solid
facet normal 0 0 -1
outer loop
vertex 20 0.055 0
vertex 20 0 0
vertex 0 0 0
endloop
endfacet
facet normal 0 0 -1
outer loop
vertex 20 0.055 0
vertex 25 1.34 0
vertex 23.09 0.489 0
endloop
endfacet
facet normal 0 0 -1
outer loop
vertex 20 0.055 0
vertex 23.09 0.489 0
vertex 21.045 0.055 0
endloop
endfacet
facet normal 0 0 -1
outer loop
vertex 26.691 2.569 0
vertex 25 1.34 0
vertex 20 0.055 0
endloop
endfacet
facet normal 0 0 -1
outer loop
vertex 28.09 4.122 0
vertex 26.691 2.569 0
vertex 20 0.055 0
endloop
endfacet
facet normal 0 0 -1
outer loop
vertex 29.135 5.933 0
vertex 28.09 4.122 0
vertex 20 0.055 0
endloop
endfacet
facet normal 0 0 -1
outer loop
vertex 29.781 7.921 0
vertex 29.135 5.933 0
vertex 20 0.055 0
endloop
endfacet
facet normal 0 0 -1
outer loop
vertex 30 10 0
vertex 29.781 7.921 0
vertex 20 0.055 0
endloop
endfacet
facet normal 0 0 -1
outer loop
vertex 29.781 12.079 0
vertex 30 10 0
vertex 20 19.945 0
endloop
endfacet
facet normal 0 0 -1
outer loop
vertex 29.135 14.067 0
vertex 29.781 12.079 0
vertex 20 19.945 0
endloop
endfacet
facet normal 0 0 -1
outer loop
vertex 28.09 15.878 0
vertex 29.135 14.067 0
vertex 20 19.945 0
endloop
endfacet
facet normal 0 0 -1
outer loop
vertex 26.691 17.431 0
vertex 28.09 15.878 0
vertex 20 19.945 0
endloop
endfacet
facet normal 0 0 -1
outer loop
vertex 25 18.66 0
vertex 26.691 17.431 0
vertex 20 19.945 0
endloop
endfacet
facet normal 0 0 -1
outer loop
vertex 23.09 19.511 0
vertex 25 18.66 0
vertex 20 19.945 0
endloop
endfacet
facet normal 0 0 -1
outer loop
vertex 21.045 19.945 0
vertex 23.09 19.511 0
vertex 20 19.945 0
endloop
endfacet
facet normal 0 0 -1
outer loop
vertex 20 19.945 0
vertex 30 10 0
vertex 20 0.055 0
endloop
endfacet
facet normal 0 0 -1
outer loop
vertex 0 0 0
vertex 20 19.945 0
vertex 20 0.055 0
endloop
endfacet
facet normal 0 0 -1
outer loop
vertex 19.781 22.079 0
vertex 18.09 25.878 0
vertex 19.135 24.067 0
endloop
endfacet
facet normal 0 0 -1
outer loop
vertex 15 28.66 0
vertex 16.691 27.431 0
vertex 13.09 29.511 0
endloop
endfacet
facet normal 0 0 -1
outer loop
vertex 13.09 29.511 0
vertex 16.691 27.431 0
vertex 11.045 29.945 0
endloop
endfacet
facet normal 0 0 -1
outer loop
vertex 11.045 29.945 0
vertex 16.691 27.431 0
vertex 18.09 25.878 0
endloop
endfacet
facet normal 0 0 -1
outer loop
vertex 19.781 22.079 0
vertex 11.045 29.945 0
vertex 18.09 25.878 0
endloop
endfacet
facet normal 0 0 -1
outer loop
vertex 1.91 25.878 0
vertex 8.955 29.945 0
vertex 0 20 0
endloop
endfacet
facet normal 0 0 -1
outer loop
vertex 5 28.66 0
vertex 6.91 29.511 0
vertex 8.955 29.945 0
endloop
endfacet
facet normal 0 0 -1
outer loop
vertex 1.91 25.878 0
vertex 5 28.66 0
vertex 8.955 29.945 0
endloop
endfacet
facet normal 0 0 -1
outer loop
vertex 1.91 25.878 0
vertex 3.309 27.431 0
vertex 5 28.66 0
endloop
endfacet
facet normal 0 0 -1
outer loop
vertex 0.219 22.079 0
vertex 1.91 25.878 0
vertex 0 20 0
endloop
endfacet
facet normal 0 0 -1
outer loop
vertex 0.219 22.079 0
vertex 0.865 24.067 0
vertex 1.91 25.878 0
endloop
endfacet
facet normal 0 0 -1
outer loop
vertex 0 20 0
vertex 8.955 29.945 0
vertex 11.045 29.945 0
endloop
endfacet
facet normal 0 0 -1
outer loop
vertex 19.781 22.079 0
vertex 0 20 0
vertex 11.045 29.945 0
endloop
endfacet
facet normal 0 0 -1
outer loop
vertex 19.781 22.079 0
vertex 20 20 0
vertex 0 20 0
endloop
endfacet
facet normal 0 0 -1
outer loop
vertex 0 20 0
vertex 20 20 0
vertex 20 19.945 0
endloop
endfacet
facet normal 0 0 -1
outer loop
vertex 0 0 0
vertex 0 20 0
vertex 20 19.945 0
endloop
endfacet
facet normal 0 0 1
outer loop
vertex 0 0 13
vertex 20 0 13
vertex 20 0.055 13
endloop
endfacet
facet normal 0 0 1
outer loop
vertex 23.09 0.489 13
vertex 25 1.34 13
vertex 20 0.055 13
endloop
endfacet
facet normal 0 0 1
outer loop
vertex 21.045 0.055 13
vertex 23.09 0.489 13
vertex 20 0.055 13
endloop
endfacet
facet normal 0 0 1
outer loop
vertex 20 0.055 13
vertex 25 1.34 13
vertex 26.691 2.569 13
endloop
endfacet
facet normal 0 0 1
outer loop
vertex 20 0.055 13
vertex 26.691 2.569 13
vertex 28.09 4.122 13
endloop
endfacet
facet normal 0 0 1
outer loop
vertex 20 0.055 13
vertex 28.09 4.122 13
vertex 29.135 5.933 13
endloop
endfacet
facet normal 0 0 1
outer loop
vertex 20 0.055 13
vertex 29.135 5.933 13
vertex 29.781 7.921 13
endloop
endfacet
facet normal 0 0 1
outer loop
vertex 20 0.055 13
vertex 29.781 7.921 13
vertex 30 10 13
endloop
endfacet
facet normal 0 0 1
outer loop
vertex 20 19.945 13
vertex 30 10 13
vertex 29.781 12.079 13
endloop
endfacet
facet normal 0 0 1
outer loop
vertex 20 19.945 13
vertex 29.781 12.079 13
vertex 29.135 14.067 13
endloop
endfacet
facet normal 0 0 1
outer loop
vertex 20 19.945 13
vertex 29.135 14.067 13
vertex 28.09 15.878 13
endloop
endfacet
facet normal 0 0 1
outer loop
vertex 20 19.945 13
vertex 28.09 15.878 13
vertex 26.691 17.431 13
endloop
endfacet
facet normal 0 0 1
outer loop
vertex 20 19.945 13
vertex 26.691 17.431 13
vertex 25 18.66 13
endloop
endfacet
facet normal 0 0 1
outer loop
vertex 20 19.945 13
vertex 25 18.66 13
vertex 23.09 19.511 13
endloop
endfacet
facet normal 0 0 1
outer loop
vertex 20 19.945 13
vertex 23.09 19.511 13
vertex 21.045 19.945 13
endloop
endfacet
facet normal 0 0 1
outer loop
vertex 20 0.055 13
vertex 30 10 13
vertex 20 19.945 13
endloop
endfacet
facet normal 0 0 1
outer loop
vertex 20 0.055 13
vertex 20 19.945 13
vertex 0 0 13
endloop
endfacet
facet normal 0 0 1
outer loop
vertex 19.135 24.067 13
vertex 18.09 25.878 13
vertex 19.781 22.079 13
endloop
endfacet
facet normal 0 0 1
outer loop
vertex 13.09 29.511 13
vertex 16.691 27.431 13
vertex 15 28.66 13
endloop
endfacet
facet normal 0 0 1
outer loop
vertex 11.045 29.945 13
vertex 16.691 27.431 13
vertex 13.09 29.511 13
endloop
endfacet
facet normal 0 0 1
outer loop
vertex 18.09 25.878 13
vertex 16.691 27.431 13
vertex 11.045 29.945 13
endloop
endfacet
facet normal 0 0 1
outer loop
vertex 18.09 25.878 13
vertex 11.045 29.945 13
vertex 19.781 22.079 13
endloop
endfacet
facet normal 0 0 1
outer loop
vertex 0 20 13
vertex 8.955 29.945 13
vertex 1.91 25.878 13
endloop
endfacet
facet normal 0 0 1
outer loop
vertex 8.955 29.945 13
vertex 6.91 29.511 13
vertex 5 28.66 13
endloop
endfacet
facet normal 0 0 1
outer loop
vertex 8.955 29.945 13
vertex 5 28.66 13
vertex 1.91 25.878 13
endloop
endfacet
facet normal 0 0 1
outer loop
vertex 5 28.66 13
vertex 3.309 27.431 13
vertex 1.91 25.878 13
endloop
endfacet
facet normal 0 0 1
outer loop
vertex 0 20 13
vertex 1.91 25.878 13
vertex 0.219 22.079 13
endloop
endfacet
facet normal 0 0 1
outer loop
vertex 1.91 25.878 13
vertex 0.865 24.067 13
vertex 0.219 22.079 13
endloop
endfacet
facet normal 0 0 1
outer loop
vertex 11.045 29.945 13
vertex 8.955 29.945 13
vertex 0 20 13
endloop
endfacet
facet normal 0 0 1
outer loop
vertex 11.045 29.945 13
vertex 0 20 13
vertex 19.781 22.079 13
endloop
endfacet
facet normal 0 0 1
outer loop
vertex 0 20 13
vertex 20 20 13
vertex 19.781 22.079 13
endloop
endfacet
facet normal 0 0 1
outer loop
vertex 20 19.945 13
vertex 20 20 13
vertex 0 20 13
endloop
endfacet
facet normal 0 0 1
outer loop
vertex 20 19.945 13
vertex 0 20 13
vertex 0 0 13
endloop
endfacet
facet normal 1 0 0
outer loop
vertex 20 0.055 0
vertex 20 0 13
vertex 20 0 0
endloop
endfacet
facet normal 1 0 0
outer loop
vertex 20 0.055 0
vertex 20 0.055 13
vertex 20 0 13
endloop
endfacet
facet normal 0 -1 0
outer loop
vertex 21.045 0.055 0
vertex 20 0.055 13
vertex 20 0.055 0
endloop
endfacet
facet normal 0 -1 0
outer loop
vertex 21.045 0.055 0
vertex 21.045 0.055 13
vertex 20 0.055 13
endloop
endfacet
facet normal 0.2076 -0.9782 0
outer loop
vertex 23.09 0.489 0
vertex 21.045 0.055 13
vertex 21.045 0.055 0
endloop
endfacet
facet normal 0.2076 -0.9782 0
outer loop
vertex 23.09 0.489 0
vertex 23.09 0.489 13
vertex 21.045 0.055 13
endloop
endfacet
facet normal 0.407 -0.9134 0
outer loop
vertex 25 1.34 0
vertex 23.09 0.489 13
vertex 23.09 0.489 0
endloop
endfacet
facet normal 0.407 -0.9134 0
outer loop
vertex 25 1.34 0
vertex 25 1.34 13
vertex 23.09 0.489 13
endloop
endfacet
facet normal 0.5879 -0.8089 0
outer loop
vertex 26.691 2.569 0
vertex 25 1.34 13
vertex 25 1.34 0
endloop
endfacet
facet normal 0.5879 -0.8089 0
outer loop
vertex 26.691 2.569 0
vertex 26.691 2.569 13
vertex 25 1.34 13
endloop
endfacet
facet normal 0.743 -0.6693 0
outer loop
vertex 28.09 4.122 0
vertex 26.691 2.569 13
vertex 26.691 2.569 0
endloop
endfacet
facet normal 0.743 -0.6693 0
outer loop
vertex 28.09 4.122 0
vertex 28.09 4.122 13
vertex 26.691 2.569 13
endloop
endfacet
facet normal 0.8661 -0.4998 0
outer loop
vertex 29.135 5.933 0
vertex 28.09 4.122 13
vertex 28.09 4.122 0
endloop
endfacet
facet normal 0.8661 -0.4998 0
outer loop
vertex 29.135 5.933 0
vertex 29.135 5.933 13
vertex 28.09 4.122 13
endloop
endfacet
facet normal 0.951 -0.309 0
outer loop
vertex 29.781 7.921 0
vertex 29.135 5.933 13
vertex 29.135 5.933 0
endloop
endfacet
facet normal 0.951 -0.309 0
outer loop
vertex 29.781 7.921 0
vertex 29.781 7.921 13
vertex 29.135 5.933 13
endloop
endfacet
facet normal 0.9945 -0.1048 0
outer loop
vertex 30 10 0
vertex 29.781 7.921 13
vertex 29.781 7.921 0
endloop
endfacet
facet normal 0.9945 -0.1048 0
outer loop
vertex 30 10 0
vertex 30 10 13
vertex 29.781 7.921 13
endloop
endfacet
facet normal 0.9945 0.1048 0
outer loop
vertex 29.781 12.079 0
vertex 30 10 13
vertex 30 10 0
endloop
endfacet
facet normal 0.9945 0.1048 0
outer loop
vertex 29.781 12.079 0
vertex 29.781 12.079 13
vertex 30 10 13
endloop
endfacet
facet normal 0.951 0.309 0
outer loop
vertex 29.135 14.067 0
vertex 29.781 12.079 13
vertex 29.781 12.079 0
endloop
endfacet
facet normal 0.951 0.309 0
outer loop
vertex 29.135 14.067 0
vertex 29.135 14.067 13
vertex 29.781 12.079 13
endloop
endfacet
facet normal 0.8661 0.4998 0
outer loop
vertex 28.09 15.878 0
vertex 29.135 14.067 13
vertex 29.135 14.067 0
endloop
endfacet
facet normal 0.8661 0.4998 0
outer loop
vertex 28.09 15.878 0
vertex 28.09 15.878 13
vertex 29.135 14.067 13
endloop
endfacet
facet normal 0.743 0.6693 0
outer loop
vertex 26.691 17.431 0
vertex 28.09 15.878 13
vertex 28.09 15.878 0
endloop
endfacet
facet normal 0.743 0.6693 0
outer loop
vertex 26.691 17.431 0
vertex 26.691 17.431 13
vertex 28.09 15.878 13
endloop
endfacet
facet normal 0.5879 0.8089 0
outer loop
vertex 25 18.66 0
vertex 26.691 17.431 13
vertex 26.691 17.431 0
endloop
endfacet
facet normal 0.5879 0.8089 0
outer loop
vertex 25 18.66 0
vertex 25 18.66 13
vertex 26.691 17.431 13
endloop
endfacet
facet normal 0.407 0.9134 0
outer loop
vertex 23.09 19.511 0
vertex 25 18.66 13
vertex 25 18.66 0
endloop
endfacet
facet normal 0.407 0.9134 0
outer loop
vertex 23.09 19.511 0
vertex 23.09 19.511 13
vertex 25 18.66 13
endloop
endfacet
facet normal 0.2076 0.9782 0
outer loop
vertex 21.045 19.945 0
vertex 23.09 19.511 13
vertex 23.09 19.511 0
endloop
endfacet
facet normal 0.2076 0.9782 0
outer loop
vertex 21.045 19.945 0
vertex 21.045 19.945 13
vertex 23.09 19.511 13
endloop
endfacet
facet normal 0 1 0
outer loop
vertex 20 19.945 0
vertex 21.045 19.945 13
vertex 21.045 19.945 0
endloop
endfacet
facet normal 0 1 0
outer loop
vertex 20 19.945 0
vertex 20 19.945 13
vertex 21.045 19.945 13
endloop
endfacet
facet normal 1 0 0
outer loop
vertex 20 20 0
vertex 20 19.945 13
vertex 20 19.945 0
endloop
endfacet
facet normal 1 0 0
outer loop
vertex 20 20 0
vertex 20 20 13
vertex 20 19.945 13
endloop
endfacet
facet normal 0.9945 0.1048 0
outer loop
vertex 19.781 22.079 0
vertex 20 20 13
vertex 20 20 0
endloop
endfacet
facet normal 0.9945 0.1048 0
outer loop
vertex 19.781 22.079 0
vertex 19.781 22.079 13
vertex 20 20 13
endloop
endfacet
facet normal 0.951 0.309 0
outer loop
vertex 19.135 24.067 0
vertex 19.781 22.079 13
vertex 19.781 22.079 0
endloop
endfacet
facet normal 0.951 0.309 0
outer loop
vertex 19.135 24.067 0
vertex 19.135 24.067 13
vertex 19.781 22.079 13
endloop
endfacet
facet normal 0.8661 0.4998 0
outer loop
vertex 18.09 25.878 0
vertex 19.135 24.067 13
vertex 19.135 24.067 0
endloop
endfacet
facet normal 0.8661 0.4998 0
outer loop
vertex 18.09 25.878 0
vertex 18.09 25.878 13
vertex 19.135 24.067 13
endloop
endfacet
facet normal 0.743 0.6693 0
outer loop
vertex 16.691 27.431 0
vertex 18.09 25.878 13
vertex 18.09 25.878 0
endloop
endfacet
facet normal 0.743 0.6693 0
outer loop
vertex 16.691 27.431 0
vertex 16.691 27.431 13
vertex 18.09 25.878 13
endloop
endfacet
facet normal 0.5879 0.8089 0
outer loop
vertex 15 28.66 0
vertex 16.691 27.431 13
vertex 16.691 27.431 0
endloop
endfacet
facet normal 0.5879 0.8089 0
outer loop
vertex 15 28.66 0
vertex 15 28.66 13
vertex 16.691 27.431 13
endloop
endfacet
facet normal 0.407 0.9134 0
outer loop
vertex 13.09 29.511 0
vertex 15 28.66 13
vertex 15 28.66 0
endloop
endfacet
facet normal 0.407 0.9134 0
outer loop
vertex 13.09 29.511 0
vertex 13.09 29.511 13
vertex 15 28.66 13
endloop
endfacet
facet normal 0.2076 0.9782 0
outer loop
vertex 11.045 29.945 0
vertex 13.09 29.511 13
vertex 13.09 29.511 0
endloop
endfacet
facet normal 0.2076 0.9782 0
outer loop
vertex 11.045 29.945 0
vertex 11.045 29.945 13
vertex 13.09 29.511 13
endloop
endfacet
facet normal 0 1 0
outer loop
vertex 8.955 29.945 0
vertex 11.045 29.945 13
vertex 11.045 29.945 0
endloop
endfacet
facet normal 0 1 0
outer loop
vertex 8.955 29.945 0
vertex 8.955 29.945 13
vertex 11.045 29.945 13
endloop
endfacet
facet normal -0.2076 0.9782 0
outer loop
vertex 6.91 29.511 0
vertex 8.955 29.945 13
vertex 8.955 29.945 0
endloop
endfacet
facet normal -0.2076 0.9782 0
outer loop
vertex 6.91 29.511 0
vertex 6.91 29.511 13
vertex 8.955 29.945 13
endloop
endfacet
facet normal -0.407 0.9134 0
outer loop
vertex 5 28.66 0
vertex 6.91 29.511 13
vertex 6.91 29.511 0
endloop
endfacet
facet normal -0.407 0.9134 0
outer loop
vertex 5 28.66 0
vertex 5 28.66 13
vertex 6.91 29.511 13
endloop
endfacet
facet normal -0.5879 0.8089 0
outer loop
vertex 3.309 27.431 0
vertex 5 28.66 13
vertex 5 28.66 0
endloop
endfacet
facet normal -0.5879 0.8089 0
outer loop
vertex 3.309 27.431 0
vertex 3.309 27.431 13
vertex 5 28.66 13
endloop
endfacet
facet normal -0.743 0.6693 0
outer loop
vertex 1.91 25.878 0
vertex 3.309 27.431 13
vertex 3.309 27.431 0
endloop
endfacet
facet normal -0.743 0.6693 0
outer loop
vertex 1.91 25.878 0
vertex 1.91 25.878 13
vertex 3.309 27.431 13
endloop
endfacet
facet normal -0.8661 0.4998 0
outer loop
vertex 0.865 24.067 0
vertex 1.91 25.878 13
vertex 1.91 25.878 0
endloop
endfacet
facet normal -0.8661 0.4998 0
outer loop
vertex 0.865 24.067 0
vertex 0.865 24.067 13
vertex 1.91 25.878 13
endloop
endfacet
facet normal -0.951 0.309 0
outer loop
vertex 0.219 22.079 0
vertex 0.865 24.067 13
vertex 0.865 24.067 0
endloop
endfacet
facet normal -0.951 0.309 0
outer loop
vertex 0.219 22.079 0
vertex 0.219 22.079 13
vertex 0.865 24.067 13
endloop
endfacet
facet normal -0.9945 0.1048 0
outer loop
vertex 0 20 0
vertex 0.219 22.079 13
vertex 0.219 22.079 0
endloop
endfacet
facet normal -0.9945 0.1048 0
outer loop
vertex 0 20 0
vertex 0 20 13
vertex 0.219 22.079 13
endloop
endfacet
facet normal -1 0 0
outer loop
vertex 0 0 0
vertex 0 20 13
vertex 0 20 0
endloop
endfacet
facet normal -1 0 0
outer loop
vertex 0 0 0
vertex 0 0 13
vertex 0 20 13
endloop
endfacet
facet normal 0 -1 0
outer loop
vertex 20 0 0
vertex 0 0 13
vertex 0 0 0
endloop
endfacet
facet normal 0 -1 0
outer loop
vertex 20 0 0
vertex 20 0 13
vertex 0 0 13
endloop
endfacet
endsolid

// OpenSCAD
module flat_heart() {
  square(20);

  translate([10, 20, 0])
  circle(10);

  translate([20, 10, 0])
  circle(10);
}

linear_extrude(height = 13) 
flat_heart();
